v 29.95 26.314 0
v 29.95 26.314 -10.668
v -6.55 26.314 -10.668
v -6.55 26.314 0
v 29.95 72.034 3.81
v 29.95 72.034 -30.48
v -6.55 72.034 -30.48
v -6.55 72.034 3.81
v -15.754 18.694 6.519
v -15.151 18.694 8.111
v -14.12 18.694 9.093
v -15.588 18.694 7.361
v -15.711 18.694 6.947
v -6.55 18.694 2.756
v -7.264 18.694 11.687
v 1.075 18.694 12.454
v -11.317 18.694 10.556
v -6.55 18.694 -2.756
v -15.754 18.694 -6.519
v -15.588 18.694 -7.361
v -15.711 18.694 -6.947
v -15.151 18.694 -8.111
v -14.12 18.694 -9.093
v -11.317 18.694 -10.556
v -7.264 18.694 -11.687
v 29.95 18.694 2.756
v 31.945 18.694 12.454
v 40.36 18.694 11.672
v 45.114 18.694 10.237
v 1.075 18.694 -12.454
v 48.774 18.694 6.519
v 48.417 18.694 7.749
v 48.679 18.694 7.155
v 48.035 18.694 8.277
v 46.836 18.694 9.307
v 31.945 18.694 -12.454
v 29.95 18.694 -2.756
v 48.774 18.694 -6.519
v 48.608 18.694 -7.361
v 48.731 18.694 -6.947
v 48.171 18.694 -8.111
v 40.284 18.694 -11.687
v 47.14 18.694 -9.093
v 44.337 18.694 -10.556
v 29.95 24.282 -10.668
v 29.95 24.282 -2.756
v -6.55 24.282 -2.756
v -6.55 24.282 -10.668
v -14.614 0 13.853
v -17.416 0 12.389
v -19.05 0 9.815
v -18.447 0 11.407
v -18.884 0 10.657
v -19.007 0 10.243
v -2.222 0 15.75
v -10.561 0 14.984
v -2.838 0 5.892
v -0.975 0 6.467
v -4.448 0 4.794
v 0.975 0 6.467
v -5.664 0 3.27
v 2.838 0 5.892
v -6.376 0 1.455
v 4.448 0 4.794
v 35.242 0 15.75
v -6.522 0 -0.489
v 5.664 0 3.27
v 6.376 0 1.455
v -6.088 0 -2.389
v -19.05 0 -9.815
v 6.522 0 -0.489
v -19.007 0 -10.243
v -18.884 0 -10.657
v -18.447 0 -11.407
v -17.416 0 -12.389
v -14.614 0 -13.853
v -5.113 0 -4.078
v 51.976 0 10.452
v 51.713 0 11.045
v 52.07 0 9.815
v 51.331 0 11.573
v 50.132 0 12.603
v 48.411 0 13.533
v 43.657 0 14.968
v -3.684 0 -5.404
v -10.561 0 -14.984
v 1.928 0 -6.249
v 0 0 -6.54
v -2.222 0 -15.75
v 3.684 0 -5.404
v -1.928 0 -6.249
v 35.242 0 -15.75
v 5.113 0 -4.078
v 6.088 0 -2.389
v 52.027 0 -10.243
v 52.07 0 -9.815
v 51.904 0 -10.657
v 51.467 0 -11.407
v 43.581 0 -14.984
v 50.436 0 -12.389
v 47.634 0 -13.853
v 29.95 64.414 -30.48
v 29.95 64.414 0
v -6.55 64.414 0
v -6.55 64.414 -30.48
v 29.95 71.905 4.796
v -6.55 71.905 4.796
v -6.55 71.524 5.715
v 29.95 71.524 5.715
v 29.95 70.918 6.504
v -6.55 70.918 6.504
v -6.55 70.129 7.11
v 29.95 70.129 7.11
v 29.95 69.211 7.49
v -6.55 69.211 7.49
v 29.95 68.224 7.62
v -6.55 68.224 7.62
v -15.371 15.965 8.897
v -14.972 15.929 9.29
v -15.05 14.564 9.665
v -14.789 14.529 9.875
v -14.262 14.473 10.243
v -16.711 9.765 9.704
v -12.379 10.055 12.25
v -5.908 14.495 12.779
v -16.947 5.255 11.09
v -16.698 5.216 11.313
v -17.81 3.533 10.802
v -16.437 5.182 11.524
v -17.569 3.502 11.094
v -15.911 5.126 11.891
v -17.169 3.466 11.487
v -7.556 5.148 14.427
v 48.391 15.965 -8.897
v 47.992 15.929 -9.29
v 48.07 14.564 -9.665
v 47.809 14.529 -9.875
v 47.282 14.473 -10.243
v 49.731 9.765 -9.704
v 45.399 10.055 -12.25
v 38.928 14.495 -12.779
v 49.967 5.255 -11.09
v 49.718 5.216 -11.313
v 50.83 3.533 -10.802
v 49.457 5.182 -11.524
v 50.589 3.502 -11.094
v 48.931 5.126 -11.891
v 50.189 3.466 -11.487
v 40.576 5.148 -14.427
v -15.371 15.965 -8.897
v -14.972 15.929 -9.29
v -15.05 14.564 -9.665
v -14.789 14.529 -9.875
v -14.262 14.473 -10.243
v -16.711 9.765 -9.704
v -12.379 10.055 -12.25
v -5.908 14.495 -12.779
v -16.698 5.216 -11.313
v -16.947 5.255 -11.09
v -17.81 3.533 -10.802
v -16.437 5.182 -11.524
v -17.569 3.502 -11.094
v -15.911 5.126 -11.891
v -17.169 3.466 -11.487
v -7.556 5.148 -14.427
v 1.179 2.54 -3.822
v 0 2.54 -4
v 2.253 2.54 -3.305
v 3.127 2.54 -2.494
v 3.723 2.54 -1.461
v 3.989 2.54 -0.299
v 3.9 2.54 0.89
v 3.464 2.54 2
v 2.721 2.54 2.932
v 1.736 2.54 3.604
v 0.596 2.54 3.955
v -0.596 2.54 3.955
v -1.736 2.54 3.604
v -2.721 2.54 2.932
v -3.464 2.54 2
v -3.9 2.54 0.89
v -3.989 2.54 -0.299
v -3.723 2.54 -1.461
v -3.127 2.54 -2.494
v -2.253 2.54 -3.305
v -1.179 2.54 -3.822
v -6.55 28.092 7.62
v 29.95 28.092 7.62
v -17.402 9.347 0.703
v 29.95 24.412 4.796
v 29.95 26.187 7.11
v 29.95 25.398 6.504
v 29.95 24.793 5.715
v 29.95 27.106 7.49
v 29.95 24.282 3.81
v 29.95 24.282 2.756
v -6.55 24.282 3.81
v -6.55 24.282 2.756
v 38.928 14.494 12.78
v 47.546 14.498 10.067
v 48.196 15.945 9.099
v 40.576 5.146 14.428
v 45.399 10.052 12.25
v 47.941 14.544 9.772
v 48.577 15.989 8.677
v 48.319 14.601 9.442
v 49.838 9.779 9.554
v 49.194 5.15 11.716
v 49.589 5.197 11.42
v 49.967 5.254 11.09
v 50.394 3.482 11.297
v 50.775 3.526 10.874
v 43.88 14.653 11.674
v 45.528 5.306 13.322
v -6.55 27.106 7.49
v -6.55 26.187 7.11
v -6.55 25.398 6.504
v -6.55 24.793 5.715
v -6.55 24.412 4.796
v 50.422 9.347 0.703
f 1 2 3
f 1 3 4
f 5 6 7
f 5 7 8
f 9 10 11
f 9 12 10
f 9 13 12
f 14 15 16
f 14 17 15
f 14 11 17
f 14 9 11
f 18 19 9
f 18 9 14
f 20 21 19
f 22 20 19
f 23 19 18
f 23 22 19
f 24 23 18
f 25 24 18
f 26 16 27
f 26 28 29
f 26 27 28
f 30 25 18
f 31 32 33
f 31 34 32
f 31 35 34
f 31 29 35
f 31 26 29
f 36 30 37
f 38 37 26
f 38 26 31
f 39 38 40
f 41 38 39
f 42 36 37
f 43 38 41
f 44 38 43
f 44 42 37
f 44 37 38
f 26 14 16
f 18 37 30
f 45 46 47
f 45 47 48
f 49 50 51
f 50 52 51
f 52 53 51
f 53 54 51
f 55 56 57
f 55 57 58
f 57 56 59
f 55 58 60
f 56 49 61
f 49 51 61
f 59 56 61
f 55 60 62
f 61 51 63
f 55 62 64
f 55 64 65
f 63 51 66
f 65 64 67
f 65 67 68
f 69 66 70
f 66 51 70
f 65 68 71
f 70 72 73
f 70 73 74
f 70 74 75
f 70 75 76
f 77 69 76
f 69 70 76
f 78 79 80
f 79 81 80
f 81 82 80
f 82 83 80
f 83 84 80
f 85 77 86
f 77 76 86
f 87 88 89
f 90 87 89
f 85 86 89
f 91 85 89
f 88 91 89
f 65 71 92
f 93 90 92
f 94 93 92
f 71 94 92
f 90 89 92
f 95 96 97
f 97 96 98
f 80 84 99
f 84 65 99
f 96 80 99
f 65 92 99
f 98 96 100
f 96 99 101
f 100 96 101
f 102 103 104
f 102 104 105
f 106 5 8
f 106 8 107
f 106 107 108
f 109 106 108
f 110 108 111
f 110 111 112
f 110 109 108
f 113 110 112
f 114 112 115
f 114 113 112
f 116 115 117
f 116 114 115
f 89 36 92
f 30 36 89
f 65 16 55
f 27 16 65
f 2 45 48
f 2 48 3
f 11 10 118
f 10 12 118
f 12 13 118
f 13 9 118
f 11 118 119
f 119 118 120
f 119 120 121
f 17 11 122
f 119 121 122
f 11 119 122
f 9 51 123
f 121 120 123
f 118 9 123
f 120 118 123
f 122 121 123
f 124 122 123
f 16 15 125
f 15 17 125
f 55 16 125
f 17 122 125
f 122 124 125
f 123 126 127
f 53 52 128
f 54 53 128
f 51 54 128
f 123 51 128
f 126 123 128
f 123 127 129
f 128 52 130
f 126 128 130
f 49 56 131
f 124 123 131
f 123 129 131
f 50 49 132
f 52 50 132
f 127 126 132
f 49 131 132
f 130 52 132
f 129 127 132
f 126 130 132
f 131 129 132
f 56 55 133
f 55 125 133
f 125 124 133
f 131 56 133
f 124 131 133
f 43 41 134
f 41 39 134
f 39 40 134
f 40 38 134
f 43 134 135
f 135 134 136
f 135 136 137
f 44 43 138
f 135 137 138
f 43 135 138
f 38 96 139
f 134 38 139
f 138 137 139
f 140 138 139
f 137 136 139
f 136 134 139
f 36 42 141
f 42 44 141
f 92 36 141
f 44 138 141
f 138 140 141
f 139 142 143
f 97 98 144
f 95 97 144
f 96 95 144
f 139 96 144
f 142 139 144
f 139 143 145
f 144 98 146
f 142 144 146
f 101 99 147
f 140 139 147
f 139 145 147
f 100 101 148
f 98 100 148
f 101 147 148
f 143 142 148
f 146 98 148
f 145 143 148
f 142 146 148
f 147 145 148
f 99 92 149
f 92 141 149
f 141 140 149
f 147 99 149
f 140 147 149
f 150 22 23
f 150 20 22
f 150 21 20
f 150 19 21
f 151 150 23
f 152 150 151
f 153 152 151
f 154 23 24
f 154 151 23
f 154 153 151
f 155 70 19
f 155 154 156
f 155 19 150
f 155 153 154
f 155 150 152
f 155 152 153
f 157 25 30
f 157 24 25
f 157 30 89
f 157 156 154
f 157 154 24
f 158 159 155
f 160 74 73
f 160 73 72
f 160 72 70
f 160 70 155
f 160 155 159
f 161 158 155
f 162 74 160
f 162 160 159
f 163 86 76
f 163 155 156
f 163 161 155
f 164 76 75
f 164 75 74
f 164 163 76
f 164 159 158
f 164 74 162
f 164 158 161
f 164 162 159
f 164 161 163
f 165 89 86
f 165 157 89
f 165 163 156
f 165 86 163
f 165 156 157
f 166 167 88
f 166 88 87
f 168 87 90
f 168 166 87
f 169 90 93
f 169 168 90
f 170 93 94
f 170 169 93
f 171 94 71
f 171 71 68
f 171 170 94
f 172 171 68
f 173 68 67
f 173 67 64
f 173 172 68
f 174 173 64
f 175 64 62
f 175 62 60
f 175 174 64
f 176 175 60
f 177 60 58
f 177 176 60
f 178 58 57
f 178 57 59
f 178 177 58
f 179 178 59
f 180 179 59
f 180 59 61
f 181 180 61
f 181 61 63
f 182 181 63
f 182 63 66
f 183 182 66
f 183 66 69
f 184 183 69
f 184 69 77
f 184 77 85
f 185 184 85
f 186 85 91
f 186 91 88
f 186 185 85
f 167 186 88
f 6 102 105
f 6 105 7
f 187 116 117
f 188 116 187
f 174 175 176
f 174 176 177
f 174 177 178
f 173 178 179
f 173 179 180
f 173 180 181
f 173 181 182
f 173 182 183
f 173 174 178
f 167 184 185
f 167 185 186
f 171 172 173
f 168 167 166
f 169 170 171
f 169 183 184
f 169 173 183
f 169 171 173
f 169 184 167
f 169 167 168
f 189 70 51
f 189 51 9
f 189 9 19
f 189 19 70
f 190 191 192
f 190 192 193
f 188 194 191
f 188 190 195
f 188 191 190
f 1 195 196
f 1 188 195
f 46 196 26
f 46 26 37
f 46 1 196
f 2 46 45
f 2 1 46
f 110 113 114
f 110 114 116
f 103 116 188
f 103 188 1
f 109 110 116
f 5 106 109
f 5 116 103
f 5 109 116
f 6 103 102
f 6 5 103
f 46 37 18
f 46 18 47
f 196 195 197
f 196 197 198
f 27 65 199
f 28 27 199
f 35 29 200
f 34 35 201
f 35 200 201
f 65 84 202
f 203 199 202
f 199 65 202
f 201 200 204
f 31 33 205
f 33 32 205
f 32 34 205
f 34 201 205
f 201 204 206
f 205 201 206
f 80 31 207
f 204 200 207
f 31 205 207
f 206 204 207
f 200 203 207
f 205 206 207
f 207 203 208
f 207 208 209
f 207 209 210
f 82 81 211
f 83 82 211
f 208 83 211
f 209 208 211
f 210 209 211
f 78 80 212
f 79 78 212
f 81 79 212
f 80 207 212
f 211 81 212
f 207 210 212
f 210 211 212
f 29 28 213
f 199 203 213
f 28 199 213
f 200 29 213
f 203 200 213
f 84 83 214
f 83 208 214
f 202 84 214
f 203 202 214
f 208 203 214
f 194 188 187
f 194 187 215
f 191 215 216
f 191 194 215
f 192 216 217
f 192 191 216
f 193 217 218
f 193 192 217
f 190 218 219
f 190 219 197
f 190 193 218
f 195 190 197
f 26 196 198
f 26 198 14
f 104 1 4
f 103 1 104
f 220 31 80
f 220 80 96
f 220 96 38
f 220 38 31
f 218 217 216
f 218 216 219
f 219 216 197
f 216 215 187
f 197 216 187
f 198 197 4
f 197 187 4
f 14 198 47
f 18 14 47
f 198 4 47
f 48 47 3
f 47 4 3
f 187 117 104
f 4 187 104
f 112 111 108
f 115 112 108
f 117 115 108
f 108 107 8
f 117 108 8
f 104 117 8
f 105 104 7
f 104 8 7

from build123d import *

# Parameters (mm, degrees)
SKETCH1_W           = 71.12
SKETCH1_H           = 31.5
BOSS_EXTRUDE1_DEPTH = 18.6944
BOSS_EXTRUDE1_TAPER = 10
SKETCH3_R           = 4
CUT_EXTRUDE1_DEPTH  = 2.54
CHAMFER1_SIZE       = 2.54
BOSS_EXTRUDE2_DEPTH = 6.55
BOSS_EXTRUDE3_START = 29.95
BOSS_EXTRUDE3_DEPTH = 29.95


# Some blends are built 0.0001 mm under size
with BuildPart() as part:
    # Sketch1 → Boss-Extrude1 (new body)
    with BuildSketch(Plane(origin=(0, 0, 0), x_dir=(1, 0, 0), z_dir=(0, 1, 0))):
        with Locations((16.51, 0)):
            Rectangle(SKETCH1_W, SKETCH1_H)
    extrude(amount=BOSS_EXTRUDE1_DEPTH, taper=BOSS_EXTRUDE1_TAPER)

    # Fillet1
    # an asymmetric fillet: 16.764, 6.35 mm, written as the material it takes off along each edge
    with BuildSketch(Plane(origin=(59.161619342, -40.218571846, 22.841619342), x_dir=(-0.985255774317392, -0.16848866057223846, 0.029709096802316298), z_dir=(-0.1710878697460354, 0.9702875252478138, -0.17108786974603588))) as fillet1_piece_1:
        with BuildLine():
            Bezier((16.580063455, 0), (0, 0), (-0.17631352, -5.844503547), weights=[1, 0.717688543, 1])
            Line((-0.17631352, -5.844503547), (0, 0))
            Line((0, 0), (16.580063455, 0))
        make_face()
    extrude(amount=102.167183553, mode=Mode.SUBTRACT)
    with BuildSketch(Plane(origin=(-26.141619342, -40.218571846, -22.841619342), x_dir=(-0.029709096802316662, -0.16848866057223877, 0.9852557743173919), z_dir=(0.1710878697460356, 0.9702875252478138, 0.1710878697460358))) as fillet1_piece_2:
        with BuildLine():
            Bezier((5.847162404, 0), (0, 0), (-0.499950087, 16.572524071), weights=[1, 0.717688543, 1])
            Line((-0.499950087, 16.572524071), (0, 0))
            Line((0, 0), (5.847162404, 0))
        make_face()
    extrude(amount=102.167183553, mode=Mode.SUBTRACT)
    with BuildSketch(Plane(origin=(59.161619342, -40.218571846, -22.841619342), x_dir=(0.029709096802316877, -0.16848866057223874, 0.9852557743173919), z_dir=(-0.1710878697460358, 0.9702875252478138, 0.1710878697460358)), Plane(origin=(-26.141619342, -40.218571846, 22.841619342), x_dir=(-0.029709096802316284, -0.16848866057223885, -0.9852557743173919), z_dir=(0.1710878697460356, 0.9702875252478138, -0.1710878697460358))) as fillet1_piece_3:
        with BuildLine():
            Bezier((5.847162404, 0), (0, 0), (-0.499950087, -16.572524071), weights=[1, 0.717688543, 1])
            Line((-0.499950087, -16.572524071), (0, 0))
            Line((0, 0), (5.847162404, 0))
        make_face()
    extrude(amount=102.167183553, mode=Mode.SUBTRACT)

    # Sketch3 → Cut-Extrude1 (cut)
    with BuildSketch(Plane.XZ):
        with Locations(Location((0, 0, 0), (0, 0, 270))):
            Circle(SKETCH3_R)
    extrude(amount=-CUT_EXTRUDE1_DEPTH, mode=Mode.SUBTRACT)

    # Chamfer1
    chamfer1_edges = [part.edges().sort_by_distance(p)[0] for p in [
        (0, 0, 4),
    ]]
    chamfer(chamfer1_edges, length=CHAMFER1_SIZE - 0.0001)  # a hair under: the kernel refuses the full size

    # Sketch4 → Boss-Extrude2 (add)
    with BuildSketch(Plane(origin=(0, 0, 0), x_dir=(0, 0, -1), z_dir=(1, 0, 0))):
        with BuildLine():
            Line((30.48, 64.4144), (30.48, 72.0344))
            Line((30.48, 72.0344), (-3.81, 72.0344))
            ThreePointArc((-3.81, 72.0344), (-6.504076836, 70.918476836), (-7.62, 68.2244))
            Line((-7.62, 68.2244), (-7.62, 64.4144))
            Line((-7.62, 64.4144), (-7.62, 28.0924))
            ThreePointArc((-7.62, 28.0924), (-6.504076836, 25.398323164), (-3.81, 24.2824))
            Line((-3.81, 24.2824), (-2.756322634, 24.2824))
            Line((-2.756322634, 24.2824), (-2.756322634, 18.6944))
            Line((-2.756322634, 18.6944), (2.756322634, 18.6944))
            Line((2.756322634, 18.6944), (2.756322634, 24.2824))
            Line((2.756322634, 24.2824), (10.668, 24.2824))
            Line((10.668, 24.2824), (10.668, 26.3144))
            Line((10.668, 26.3144), (0, 26.3144))
            Line((0, 26.3144), (0, 64.4144))
            Line((0, 64.4144), (30.48, 64.4144))
        make_face()
    extrude(amount=-BOSS_EXTRUDE2_DEPTH)

    # Sketch5 → Boss-Extrude3 (add)
    with BuildSketch(Plane(origin=(0, 0, 0), x_dir=(0, 0, -1), z_dir=(1, 0, 0)).offset(BOSS_EXTRUDE3_START)):
        with BuildLine():
            Line((-7.62, 68.2244), (-7.62, 28.0924))
            ThreePointArc((-7.62, 28.0924), (-6.504076836, 25.398323164), (-3.81, 24.2824))
            Line((-3.81, 24.2824), (-2.756322634, 24.2824))
            Line((-2.756322634, 24.2824), (-2.756322634, 18.6944))
            Line((-2.756322634, 18.6944), (2.756322634, 18.6944))
            Line((2.756322634, 18.6944), (2.756322634, 24.2824))
            Line((2.756322634, 24.2824), (10.668, 24.2824))
            Line((10.668, 24.2824), (10.668, 26.3144))
            Line((10.668, 26.3144), (0, 26.3144))
            Line((0, 26.3144), (0, 64.4144))
            Line((0, 64.4144), (30.48, 64.4144))
            Line((30.48, 64.4144), (30.48, 72.0344))
            Line((30.48, 72.0344), (-3.81, 72.0344))
            ThreePointArc((-3.81, 72.0344), (-6.504076836, 70.918476836), (-7.62, 68.2244))
        make_face()
    extrude(amount=-BOSS_EXTRUDE3_DEPTH)


solid = part.part
